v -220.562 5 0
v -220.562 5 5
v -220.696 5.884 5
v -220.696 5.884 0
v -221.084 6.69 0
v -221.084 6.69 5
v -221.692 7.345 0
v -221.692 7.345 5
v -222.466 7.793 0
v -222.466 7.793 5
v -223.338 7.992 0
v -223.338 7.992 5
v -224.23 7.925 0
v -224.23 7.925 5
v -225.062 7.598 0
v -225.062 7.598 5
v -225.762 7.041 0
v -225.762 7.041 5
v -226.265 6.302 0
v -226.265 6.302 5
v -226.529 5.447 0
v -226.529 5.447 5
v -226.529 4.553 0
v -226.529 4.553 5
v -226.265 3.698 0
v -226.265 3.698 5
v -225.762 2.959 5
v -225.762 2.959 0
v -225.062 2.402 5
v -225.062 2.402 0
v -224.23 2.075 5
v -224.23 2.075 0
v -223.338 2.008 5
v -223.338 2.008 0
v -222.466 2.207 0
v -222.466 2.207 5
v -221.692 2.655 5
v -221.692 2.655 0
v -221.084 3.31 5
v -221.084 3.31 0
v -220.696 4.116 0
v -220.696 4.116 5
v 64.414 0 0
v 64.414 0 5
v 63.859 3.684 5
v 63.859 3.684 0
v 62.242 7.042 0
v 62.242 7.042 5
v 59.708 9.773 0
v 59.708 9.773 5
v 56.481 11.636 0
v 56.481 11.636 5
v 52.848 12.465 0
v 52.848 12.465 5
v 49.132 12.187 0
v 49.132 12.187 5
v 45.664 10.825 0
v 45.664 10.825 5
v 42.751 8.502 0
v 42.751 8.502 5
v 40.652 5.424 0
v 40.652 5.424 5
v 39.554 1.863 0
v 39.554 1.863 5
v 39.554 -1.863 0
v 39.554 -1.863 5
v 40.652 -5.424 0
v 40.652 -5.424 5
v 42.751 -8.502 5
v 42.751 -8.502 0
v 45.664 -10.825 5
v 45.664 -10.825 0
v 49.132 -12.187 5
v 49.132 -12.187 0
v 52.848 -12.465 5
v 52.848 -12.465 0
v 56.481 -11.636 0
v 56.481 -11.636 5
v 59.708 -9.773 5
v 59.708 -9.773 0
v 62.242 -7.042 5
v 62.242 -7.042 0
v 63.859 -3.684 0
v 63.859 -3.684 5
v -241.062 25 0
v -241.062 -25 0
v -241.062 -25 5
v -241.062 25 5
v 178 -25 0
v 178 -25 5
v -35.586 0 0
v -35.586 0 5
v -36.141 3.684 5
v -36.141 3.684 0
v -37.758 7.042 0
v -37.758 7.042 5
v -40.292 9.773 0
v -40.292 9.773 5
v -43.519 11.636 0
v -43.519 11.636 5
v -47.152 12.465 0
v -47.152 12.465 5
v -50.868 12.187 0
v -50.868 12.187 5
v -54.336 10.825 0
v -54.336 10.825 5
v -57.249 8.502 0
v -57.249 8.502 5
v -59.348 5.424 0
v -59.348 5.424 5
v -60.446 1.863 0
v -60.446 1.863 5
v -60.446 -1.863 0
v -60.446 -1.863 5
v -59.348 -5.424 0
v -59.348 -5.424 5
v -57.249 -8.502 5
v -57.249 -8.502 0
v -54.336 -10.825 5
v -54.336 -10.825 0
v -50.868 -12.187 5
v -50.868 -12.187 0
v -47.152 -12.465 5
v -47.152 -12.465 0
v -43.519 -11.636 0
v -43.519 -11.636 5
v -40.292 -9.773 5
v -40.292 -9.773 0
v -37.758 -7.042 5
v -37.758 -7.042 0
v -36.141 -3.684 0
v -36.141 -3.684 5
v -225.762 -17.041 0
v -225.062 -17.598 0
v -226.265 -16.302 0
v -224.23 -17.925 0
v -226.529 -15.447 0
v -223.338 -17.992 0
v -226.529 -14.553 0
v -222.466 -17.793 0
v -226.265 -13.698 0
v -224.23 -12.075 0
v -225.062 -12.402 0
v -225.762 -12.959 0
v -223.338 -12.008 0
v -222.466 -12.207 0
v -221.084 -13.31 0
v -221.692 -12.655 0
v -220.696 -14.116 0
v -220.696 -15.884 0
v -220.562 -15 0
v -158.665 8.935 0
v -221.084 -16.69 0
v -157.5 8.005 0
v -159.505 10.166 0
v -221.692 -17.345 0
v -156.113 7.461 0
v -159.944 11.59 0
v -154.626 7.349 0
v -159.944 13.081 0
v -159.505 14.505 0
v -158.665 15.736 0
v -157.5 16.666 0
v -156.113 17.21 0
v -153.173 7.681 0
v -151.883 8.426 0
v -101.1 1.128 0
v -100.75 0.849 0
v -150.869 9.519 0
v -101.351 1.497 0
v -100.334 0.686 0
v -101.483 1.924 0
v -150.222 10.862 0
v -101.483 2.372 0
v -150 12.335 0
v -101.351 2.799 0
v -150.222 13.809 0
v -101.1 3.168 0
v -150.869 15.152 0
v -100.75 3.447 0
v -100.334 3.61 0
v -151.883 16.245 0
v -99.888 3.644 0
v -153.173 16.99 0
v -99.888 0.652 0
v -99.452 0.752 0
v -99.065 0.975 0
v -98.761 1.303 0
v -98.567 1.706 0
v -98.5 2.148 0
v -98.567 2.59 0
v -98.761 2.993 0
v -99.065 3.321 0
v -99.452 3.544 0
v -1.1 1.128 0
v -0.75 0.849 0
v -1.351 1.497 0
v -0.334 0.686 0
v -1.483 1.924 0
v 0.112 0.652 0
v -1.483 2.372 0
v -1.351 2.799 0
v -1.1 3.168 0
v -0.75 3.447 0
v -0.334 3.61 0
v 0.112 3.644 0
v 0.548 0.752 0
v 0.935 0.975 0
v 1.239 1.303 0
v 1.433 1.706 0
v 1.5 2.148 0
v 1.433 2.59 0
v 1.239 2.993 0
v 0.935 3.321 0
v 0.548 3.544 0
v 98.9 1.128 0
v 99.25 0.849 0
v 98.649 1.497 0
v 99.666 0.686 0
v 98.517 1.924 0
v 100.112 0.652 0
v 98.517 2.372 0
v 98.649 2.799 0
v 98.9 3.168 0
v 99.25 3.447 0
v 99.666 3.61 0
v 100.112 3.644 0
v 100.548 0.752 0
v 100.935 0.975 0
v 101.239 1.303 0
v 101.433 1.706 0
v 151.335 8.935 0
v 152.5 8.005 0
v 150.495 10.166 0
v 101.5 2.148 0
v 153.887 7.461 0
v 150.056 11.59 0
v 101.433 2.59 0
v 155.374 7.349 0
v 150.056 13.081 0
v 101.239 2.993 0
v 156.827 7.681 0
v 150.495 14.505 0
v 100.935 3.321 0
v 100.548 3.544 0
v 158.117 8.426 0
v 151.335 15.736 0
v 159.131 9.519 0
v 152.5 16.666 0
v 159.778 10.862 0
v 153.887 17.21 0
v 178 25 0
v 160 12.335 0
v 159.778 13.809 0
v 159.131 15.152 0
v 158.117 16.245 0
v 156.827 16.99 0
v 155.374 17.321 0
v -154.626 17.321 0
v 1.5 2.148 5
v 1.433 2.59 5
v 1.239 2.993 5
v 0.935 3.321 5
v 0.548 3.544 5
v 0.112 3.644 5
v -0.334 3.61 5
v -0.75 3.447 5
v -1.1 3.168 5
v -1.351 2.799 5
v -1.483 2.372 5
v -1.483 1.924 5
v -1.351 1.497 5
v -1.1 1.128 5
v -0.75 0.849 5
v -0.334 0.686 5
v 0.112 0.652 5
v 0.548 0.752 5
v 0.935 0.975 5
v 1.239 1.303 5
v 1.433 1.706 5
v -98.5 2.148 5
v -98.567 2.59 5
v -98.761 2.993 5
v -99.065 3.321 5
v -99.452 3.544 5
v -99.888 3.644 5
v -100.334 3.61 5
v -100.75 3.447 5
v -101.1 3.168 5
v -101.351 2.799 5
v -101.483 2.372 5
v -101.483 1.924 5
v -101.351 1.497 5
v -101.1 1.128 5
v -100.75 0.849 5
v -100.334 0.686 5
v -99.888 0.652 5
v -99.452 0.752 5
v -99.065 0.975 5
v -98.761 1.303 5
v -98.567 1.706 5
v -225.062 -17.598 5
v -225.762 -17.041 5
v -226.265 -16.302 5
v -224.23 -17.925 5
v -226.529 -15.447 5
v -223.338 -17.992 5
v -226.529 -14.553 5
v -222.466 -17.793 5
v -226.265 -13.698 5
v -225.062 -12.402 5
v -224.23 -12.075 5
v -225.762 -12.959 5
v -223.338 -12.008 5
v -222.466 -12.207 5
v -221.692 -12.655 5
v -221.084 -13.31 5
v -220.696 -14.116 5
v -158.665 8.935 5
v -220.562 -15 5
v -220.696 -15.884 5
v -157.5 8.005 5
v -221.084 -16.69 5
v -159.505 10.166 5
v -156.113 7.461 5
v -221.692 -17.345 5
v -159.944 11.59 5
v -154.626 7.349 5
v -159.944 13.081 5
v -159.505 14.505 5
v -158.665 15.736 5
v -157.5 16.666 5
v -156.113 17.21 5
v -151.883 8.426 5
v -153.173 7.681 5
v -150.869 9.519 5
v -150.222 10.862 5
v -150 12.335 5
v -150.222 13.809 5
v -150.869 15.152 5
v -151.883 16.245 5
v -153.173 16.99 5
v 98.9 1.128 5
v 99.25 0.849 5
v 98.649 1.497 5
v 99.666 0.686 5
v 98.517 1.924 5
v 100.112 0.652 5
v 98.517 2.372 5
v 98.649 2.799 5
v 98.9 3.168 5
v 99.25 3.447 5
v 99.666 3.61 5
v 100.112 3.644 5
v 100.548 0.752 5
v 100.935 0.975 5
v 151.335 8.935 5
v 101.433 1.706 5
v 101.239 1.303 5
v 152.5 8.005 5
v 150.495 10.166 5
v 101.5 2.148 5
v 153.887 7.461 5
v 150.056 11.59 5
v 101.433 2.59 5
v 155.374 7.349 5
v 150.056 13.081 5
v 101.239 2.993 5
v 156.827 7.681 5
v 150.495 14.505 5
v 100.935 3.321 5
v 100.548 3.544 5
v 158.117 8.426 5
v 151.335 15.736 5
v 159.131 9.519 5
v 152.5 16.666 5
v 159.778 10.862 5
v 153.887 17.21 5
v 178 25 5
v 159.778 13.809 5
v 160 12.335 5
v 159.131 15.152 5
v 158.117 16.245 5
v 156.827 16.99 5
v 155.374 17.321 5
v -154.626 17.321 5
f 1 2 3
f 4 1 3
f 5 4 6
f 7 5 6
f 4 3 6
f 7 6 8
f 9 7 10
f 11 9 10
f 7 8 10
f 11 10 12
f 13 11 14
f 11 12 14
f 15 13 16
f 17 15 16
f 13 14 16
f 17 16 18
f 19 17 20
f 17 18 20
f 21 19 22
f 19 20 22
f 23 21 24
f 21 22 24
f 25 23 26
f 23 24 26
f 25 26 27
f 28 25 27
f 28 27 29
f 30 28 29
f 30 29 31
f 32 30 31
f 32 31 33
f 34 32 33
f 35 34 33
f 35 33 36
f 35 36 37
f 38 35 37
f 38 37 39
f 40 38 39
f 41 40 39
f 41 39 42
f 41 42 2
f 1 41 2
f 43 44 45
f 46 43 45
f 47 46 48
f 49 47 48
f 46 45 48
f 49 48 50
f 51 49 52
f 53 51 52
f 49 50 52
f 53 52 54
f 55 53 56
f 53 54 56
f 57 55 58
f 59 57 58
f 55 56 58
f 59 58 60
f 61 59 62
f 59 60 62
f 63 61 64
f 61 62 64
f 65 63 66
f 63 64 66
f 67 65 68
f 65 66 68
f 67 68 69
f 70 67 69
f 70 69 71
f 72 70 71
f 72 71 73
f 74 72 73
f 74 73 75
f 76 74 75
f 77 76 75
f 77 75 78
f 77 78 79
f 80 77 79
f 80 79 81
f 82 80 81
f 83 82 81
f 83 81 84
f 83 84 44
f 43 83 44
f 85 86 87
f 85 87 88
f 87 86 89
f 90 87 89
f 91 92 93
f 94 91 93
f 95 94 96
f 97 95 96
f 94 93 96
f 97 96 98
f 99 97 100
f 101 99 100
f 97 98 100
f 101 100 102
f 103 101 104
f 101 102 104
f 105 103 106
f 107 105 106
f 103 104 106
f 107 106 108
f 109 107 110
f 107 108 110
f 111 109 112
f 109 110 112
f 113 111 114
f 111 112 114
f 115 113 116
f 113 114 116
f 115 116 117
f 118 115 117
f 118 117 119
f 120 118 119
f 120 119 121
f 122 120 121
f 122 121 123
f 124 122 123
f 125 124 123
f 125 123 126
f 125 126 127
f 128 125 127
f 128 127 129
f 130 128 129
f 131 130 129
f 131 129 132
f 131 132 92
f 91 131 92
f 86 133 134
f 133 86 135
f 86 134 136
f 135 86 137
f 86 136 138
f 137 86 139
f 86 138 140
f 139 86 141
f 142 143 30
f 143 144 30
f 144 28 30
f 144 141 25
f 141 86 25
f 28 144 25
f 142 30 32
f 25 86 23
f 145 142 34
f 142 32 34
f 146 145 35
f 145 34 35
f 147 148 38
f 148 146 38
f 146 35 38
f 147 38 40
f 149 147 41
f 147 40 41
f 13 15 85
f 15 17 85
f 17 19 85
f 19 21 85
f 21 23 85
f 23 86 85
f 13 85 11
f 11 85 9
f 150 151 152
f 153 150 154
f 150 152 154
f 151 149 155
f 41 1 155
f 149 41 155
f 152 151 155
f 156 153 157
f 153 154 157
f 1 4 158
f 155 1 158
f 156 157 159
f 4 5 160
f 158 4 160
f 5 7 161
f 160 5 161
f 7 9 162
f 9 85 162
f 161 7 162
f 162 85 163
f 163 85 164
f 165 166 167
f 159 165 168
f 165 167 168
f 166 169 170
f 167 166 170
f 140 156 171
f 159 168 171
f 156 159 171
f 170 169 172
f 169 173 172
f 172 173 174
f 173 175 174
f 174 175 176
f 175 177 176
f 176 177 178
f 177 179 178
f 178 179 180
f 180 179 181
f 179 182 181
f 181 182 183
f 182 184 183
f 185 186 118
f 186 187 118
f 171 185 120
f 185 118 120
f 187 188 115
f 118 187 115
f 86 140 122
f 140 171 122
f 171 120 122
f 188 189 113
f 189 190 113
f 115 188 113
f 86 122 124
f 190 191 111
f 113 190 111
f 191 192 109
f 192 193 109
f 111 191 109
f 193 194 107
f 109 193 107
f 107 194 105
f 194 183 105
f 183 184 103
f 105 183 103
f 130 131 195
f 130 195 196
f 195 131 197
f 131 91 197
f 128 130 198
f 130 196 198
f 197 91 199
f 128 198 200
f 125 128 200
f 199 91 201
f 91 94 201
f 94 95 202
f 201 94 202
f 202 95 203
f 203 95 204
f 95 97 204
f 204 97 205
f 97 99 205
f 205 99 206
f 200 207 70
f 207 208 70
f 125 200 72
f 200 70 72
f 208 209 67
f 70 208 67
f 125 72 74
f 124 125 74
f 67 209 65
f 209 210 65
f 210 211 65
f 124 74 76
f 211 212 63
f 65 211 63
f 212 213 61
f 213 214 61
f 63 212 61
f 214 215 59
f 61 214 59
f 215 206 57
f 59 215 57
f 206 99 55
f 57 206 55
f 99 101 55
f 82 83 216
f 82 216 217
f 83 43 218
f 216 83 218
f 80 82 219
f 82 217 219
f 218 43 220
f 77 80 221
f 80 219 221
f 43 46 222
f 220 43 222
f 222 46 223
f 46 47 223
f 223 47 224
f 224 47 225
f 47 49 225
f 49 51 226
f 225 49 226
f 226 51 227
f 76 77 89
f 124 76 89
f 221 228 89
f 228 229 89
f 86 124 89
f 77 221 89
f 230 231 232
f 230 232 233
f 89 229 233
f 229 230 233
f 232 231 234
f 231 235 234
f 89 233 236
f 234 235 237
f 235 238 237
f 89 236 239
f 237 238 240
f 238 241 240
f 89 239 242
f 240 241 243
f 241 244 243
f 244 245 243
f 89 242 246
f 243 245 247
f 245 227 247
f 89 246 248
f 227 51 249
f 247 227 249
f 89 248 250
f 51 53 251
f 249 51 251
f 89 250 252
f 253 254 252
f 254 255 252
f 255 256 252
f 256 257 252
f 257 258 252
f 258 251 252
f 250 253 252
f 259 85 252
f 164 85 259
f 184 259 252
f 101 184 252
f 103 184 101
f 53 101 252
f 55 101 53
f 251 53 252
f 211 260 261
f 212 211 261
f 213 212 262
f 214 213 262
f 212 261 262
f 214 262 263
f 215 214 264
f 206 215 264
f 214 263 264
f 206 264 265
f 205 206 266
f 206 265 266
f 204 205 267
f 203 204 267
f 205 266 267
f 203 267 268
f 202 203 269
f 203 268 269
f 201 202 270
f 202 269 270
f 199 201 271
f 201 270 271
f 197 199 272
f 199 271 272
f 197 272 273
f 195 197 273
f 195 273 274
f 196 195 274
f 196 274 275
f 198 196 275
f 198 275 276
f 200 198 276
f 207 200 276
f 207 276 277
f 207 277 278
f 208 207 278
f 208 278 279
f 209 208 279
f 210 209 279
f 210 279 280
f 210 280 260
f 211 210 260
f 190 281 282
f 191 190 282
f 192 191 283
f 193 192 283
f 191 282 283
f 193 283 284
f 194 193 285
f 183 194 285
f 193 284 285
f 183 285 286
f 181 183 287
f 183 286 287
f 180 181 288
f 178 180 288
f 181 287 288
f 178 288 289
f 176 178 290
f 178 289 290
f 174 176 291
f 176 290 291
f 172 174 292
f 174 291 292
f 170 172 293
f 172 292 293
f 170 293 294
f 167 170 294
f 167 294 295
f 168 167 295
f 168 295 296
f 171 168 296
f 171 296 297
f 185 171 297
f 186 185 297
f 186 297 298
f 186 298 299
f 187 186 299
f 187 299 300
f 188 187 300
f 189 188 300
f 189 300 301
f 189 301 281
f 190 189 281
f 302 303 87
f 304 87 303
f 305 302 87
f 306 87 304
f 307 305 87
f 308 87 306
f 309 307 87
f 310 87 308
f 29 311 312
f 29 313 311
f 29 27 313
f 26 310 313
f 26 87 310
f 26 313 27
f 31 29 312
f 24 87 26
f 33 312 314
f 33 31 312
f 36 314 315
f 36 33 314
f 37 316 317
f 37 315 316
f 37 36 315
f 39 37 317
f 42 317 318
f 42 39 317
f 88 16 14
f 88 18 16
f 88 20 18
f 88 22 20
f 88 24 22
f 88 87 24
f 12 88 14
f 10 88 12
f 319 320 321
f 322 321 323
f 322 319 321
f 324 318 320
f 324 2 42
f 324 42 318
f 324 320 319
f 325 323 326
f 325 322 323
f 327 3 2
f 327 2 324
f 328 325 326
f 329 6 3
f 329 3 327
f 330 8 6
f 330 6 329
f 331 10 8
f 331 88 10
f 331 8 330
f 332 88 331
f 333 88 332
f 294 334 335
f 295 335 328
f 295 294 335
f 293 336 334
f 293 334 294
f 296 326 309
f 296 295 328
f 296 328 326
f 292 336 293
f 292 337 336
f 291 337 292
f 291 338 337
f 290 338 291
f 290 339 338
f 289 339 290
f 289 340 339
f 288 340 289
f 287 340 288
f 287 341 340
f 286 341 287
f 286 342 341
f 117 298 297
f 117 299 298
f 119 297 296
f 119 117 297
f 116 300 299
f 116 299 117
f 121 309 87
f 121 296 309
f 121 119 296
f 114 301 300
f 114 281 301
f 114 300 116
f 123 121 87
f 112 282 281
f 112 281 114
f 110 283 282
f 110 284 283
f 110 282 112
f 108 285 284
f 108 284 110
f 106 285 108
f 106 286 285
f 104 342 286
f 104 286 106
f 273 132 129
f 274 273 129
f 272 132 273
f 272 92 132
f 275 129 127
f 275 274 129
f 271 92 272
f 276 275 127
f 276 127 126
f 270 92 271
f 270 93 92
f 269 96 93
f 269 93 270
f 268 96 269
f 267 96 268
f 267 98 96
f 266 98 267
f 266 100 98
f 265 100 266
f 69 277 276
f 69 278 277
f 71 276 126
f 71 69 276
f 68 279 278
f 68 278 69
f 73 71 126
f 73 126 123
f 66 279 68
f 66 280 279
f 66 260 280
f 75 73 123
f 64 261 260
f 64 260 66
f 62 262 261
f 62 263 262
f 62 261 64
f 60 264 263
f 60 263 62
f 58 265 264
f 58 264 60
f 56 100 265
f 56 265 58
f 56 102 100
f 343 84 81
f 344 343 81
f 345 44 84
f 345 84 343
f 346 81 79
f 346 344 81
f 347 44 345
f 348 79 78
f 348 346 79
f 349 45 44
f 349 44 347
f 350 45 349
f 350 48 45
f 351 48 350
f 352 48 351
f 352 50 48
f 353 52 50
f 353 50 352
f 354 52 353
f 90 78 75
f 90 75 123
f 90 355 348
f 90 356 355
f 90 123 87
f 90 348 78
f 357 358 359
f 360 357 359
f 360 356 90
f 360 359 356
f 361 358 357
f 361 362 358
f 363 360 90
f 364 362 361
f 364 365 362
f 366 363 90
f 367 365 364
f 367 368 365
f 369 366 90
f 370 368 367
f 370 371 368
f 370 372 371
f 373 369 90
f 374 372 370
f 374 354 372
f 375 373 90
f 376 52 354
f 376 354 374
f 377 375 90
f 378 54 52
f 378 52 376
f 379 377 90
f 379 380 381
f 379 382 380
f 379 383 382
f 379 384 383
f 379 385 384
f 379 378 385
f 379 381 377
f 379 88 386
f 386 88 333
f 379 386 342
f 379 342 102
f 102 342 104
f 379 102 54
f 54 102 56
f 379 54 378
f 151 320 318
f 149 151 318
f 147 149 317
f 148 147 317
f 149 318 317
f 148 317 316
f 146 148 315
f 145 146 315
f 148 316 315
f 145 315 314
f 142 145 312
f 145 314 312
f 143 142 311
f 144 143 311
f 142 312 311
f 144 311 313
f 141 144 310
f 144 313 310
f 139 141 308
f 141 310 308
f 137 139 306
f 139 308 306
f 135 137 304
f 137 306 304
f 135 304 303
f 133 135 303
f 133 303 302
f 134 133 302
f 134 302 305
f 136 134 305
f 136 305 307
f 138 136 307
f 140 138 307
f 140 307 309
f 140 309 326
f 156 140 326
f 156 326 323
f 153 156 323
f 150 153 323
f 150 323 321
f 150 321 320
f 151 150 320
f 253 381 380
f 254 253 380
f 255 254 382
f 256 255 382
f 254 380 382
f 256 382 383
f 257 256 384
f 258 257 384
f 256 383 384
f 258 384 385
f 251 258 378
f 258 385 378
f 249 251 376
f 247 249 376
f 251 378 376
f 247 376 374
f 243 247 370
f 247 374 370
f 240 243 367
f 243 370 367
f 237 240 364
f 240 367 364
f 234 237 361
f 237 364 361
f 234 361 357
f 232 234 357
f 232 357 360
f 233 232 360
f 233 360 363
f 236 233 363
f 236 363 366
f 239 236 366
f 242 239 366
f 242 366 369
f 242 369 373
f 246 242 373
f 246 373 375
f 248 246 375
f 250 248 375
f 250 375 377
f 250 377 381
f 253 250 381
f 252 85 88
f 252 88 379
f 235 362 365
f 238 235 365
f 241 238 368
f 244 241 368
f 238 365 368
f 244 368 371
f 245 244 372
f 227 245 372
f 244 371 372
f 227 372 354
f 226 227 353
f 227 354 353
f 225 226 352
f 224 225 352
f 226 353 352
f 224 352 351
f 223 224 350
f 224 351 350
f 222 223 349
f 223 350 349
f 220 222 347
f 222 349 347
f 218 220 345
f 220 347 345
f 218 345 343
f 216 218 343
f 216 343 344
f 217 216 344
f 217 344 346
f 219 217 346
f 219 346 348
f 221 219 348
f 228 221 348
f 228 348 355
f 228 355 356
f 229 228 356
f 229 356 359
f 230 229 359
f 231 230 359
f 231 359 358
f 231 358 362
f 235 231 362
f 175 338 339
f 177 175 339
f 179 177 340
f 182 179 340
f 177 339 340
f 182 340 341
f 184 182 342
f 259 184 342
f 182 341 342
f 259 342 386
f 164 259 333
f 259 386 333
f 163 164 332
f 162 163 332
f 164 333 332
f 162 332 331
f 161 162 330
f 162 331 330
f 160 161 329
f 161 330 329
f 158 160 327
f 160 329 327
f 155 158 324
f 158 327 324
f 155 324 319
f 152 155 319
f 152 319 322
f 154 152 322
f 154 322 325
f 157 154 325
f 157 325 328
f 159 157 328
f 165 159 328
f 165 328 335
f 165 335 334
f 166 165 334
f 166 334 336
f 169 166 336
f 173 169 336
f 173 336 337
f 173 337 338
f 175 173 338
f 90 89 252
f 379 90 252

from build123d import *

# Parameters (mm, degrees)
F0_W      = 356
F0_H      = 50
F1_DEPTH  = 5
F2_R      = 5
F2_R_2    = 12.5
F3_DEPTH  = 5.001
F4_R      = 1.5
F5_DEPTH  = 5.001
F6_W      = 49.406879
F6_H      = 21.095738
F7_DEPTH  = 25
F9_W      = 63.062
F9_H      = 50
F10_DEPTH = 5
F11_R     = 3
F12_DEPTH = 25


with BuildPart() as f1:
    # F0 (on Top) → F1 (new body)
    with BuildSketch(Plane.XY):
        Rectangle(F0_W, F0_H)
    extrude(amount=F1_DEPTH)

    # F2 (on face) → F3 (cut, through all)
    with BuildSketch(Plane.XY.offset(5)):
        with Locations((-155, 12.335402)):
            Circle(F2_R)
        with Locations((155, 12.335402)):
            Circle(F2_R)
        with Locations((-48.086096, 0)):
            Circle(F2_R_2)
        with Locations((51.913904, 0)):
            Circle(F2_R_2)
    extrude(amount=-F3_DEPTH, mode=Mode.SUBTRACT)

    # F4 (on face) → F5 (cut, through all)
    with BuildSketch(Plane.XY.offset(5)):
        with Locations((0, 2.148001)):
            Circle(F4_R)
        with Locations((100, 2.148001)):
            Circle(F4_R)
        with Locations((-100, 2.148001)):
            Circle(F4_R)
    extrude(amount=-F5_DEPTH, mode=Mode.SUBTRACT)

    # F9 (on Top) → F10 (join, through all)
    with BuildSketch(Plane.XY):
        with Locations((-209.531, 0)):
            Rectangle(F9_W, F9_H)
    extrude(amount=F10_DEPTH)

    # F11 (on face) → F12 (cut)
    with BuildSketch(Plane.XY.offset(5)):
        with Locations((-223.56236, 5)):
            Circle(F11_R)
        with Locations((-223.56236, -15)):
            Circle(F11_R)
    extrude(amount=-F12_DEPTH, mode=Mode.SUBTRACT)


with BuildPart() as f7:
    # F6 (on Top) → F7 (new body)
    with BuildSketch(Plane.XY):
        with Locations((37.024449, 48.380569)):
            Rectangle(F6_W, F6_H)
    extrude(amount=F7_DEPTH)


solid = f1.part
